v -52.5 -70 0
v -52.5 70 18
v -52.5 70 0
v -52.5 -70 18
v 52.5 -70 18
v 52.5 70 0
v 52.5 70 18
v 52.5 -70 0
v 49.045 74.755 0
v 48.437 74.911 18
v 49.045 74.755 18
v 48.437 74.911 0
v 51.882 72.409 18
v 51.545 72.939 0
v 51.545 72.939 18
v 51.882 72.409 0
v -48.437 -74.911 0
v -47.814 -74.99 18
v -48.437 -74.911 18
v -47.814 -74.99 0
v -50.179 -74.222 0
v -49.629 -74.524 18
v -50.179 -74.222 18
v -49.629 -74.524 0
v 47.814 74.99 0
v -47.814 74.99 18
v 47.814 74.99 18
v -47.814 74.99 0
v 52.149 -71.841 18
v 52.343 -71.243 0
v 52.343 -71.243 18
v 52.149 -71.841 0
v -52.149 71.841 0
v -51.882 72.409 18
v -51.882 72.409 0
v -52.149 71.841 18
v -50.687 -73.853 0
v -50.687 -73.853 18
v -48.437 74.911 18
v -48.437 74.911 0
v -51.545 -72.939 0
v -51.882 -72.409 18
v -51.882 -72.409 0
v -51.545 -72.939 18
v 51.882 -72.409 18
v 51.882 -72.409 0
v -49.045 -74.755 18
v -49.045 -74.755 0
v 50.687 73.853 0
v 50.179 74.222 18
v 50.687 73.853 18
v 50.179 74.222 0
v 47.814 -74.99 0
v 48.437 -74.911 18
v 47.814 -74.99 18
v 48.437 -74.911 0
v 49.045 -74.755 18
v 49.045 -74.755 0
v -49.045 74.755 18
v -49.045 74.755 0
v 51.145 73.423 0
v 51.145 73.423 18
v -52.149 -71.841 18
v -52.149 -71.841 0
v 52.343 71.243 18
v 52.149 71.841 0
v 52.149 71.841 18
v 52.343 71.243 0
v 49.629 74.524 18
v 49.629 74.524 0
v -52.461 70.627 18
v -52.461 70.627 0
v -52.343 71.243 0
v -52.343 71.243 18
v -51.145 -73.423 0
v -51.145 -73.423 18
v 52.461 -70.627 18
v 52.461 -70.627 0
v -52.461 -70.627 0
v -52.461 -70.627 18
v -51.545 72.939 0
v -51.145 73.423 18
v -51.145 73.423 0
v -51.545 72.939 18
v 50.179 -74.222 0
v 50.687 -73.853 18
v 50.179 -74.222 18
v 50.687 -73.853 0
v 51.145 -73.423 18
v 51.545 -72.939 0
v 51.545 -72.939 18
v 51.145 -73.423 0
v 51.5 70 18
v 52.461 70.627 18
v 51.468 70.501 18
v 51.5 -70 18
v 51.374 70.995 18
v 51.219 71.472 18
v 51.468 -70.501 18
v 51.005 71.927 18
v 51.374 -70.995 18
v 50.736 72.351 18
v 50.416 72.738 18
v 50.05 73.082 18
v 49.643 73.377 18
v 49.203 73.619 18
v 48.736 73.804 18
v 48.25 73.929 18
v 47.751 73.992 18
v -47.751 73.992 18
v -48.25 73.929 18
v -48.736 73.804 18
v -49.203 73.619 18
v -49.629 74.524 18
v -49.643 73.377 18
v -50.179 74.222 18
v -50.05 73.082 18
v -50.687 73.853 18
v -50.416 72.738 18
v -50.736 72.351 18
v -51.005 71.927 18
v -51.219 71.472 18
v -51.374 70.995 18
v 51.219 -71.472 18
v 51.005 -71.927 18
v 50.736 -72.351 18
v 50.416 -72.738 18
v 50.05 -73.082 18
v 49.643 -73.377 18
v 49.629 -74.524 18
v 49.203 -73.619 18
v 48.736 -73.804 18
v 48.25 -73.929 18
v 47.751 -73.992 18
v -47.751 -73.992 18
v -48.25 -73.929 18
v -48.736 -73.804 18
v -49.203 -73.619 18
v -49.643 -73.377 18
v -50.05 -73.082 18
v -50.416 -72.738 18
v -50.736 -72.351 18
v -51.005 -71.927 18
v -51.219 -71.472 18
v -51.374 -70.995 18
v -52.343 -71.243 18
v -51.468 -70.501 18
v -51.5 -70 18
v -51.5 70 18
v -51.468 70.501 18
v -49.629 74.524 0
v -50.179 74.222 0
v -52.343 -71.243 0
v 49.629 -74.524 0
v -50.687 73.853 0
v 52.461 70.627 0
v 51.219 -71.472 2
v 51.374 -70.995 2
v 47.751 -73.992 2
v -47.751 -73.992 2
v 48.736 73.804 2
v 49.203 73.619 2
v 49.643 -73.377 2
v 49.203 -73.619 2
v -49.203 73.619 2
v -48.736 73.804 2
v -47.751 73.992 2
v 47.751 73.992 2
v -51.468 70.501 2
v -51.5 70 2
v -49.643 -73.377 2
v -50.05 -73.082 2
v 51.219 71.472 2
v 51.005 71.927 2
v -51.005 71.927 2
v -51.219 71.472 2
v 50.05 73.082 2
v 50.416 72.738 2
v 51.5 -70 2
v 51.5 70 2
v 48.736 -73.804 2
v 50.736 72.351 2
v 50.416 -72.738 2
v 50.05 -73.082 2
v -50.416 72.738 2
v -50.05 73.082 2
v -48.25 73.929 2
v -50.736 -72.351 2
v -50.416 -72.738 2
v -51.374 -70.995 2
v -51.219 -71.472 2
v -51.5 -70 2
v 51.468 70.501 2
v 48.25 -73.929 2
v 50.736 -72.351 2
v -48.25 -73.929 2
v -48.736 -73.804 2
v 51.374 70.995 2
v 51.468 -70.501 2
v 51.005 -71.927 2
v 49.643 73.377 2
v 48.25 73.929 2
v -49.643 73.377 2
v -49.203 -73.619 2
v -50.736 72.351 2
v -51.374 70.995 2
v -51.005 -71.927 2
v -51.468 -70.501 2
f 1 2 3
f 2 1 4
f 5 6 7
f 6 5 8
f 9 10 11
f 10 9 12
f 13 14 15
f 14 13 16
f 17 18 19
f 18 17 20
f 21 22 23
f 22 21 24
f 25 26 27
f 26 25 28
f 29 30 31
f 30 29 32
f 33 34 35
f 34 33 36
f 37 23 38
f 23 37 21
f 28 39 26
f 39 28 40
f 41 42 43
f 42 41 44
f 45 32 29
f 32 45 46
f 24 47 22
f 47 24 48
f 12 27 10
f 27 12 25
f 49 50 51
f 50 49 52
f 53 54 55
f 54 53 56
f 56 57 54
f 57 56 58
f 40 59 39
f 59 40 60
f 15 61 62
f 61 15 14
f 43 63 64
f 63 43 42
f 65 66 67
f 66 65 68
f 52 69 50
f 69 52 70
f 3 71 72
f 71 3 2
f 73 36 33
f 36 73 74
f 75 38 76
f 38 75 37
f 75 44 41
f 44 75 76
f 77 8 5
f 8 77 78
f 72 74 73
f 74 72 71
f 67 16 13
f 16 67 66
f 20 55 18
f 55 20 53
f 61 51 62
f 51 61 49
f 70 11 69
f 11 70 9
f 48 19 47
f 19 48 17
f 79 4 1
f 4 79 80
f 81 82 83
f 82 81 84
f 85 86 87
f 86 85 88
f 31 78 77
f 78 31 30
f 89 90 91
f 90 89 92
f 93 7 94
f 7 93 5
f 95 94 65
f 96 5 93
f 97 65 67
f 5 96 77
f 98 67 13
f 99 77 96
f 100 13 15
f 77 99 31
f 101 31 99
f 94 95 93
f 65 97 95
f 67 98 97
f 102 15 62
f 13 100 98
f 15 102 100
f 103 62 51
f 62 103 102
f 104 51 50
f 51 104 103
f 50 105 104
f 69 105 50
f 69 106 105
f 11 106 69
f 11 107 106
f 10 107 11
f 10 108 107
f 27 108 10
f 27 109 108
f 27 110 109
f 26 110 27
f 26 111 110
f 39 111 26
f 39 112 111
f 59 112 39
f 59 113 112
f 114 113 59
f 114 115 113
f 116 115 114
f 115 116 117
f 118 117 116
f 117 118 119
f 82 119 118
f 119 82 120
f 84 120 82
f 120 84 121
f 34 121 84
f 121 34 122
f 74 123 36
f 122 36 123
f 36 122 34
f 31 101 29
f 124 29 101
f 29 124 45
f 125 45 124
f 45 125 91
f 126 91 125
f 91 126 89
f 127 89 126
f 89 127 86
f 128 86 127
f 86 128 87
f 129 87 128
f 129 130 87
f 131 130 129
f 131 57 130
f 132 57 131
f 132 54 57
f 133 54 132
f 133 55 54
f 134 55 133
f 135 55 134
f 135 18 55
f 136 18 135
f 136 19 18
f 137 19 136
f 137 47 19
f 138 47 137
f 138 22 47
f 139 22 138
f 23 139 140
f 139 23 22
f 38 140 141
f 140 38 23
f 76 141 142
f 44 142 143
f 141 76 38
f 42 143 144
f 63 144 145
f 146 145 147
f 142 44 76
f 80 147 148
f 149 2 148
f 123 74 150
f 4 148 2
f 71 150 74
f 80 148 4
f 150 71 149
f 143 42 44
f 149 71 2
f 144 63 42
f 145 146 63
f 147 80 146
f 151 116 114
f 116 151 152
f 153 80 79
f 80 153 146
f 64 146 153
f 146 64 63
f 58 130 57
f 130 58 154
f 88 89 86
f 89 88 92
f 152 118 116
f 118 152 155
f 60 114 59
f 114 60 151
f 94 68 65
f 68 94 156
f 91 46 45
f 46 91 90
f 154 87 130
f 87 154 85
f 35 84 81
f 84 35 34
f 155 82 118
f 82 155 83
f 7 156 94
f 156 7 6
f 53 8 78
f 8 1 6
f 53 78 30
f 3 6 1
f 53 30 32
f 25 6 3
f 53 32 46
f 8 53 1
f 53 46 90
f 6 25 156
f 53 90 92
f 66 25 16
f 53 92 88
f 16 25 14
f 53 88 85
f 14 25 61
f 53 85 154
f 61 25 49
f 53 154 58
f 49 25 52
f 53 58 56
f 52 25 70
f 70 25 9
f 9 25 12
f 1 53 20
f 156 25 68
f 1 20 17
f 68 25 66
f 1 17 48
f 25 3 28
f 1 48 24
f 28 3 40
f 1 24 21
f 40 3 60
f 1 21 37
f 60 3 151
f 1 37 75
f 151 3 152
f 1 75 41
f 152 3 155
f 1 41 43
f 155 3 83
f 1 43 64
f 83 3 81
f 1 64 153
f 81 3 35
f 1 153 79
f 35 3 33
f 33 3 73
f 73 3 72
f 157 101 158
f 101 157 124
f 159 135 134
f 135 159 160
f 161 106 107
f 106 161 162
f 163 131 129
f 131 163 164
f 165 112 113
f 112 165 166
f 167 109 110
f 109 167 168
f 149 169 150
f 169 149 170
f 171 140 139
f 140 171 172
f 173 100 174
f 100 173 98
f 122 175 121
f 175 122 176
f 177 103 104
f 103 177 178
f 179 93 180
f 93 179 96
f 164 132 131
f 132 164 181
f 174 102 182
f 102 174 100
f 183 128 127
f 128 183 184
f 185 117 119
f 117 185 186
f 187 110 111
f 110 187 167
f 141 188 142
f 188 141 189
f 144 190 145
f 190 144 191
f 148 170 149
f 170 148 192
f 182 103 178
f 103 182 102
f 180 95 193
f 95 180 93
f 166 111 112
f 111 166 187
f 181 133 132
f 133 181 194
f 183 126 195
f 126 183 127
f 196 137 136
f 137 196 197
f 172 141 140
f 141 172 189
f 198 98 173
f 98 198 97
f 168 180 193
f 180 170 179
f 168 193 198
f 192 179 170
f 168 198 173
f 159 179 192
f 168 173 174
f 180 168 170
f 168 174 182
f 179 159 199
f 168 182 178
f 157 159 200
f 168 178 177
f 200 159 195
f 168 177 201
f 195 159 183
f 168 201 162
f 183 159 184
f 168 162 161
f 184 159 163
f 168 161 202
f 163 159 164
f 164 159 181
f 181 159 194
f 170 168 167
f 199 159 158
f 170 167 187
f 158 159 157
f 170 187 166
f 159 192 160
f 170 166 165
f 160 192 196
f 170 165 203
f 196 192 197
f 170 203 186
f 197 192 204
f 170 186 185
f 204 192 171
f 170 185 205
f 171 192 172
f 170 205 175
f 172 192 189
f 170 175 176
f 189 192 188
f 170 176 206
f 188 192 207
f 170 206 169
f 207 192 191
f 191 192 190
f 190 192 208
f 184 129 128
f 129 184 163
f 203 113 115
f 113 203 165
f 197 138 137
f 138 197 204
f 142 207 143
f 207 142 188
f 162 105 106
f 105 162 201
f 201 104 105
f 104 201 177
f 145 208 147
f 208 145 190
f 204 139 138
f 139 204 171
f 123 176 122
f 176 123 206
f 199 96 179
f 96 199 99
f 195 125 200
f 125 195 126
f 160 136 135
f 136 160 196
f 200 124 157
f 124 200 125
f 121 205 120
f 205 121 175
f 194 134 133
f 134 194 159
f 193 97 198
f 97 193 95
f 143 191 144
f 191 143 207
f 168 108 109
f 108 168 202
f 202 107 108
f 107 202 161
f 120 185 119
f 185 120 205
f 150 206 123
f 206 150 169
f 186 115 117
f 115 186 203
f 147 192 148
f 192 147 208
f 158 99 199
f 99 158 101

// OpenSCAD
$fn = 50;


difference() {
	union() {
		hull() {
			translate(v = [-47.5000000000, 70.0000000000, 0]) {
				cylinder(h = 18, r = 5);
			}
			translate(v = [47.5000000000, 70.0000000000, 0]) {
				cylinder(h = 18, r = 5);
			}
			translate(v = [-47.5000000000, -70.0000000000, 0]) {
				cylinder(h = 18, r = 5);
			}
			translate(v = [47.5000000000, -70.0000000000, 0]) {
				cylinder(h = 18, r = 5);
			}
		}
	}
	union() {
		translate(v = [0, 0, 2]) {
			hull() {
				translate(v = [-47.5000000000, 70.0000000000, 0]) {
					cylinder(h = 16, r = 4);
				}
				translate(v = [47.5000000000, 70.0000000000, 0]) {
					cylinder(h = 16, r = 4);
				}
				translate(v = [-47.5000000000, -70.0000000000, 0]) {
					cylinder(h = 16, r = 4);
				}
				translate(v = [47.5000000000, -70.0000000000, 0]) {
					cylinder(h = 16, r = 4);
				}
			}
		}
	}
}
